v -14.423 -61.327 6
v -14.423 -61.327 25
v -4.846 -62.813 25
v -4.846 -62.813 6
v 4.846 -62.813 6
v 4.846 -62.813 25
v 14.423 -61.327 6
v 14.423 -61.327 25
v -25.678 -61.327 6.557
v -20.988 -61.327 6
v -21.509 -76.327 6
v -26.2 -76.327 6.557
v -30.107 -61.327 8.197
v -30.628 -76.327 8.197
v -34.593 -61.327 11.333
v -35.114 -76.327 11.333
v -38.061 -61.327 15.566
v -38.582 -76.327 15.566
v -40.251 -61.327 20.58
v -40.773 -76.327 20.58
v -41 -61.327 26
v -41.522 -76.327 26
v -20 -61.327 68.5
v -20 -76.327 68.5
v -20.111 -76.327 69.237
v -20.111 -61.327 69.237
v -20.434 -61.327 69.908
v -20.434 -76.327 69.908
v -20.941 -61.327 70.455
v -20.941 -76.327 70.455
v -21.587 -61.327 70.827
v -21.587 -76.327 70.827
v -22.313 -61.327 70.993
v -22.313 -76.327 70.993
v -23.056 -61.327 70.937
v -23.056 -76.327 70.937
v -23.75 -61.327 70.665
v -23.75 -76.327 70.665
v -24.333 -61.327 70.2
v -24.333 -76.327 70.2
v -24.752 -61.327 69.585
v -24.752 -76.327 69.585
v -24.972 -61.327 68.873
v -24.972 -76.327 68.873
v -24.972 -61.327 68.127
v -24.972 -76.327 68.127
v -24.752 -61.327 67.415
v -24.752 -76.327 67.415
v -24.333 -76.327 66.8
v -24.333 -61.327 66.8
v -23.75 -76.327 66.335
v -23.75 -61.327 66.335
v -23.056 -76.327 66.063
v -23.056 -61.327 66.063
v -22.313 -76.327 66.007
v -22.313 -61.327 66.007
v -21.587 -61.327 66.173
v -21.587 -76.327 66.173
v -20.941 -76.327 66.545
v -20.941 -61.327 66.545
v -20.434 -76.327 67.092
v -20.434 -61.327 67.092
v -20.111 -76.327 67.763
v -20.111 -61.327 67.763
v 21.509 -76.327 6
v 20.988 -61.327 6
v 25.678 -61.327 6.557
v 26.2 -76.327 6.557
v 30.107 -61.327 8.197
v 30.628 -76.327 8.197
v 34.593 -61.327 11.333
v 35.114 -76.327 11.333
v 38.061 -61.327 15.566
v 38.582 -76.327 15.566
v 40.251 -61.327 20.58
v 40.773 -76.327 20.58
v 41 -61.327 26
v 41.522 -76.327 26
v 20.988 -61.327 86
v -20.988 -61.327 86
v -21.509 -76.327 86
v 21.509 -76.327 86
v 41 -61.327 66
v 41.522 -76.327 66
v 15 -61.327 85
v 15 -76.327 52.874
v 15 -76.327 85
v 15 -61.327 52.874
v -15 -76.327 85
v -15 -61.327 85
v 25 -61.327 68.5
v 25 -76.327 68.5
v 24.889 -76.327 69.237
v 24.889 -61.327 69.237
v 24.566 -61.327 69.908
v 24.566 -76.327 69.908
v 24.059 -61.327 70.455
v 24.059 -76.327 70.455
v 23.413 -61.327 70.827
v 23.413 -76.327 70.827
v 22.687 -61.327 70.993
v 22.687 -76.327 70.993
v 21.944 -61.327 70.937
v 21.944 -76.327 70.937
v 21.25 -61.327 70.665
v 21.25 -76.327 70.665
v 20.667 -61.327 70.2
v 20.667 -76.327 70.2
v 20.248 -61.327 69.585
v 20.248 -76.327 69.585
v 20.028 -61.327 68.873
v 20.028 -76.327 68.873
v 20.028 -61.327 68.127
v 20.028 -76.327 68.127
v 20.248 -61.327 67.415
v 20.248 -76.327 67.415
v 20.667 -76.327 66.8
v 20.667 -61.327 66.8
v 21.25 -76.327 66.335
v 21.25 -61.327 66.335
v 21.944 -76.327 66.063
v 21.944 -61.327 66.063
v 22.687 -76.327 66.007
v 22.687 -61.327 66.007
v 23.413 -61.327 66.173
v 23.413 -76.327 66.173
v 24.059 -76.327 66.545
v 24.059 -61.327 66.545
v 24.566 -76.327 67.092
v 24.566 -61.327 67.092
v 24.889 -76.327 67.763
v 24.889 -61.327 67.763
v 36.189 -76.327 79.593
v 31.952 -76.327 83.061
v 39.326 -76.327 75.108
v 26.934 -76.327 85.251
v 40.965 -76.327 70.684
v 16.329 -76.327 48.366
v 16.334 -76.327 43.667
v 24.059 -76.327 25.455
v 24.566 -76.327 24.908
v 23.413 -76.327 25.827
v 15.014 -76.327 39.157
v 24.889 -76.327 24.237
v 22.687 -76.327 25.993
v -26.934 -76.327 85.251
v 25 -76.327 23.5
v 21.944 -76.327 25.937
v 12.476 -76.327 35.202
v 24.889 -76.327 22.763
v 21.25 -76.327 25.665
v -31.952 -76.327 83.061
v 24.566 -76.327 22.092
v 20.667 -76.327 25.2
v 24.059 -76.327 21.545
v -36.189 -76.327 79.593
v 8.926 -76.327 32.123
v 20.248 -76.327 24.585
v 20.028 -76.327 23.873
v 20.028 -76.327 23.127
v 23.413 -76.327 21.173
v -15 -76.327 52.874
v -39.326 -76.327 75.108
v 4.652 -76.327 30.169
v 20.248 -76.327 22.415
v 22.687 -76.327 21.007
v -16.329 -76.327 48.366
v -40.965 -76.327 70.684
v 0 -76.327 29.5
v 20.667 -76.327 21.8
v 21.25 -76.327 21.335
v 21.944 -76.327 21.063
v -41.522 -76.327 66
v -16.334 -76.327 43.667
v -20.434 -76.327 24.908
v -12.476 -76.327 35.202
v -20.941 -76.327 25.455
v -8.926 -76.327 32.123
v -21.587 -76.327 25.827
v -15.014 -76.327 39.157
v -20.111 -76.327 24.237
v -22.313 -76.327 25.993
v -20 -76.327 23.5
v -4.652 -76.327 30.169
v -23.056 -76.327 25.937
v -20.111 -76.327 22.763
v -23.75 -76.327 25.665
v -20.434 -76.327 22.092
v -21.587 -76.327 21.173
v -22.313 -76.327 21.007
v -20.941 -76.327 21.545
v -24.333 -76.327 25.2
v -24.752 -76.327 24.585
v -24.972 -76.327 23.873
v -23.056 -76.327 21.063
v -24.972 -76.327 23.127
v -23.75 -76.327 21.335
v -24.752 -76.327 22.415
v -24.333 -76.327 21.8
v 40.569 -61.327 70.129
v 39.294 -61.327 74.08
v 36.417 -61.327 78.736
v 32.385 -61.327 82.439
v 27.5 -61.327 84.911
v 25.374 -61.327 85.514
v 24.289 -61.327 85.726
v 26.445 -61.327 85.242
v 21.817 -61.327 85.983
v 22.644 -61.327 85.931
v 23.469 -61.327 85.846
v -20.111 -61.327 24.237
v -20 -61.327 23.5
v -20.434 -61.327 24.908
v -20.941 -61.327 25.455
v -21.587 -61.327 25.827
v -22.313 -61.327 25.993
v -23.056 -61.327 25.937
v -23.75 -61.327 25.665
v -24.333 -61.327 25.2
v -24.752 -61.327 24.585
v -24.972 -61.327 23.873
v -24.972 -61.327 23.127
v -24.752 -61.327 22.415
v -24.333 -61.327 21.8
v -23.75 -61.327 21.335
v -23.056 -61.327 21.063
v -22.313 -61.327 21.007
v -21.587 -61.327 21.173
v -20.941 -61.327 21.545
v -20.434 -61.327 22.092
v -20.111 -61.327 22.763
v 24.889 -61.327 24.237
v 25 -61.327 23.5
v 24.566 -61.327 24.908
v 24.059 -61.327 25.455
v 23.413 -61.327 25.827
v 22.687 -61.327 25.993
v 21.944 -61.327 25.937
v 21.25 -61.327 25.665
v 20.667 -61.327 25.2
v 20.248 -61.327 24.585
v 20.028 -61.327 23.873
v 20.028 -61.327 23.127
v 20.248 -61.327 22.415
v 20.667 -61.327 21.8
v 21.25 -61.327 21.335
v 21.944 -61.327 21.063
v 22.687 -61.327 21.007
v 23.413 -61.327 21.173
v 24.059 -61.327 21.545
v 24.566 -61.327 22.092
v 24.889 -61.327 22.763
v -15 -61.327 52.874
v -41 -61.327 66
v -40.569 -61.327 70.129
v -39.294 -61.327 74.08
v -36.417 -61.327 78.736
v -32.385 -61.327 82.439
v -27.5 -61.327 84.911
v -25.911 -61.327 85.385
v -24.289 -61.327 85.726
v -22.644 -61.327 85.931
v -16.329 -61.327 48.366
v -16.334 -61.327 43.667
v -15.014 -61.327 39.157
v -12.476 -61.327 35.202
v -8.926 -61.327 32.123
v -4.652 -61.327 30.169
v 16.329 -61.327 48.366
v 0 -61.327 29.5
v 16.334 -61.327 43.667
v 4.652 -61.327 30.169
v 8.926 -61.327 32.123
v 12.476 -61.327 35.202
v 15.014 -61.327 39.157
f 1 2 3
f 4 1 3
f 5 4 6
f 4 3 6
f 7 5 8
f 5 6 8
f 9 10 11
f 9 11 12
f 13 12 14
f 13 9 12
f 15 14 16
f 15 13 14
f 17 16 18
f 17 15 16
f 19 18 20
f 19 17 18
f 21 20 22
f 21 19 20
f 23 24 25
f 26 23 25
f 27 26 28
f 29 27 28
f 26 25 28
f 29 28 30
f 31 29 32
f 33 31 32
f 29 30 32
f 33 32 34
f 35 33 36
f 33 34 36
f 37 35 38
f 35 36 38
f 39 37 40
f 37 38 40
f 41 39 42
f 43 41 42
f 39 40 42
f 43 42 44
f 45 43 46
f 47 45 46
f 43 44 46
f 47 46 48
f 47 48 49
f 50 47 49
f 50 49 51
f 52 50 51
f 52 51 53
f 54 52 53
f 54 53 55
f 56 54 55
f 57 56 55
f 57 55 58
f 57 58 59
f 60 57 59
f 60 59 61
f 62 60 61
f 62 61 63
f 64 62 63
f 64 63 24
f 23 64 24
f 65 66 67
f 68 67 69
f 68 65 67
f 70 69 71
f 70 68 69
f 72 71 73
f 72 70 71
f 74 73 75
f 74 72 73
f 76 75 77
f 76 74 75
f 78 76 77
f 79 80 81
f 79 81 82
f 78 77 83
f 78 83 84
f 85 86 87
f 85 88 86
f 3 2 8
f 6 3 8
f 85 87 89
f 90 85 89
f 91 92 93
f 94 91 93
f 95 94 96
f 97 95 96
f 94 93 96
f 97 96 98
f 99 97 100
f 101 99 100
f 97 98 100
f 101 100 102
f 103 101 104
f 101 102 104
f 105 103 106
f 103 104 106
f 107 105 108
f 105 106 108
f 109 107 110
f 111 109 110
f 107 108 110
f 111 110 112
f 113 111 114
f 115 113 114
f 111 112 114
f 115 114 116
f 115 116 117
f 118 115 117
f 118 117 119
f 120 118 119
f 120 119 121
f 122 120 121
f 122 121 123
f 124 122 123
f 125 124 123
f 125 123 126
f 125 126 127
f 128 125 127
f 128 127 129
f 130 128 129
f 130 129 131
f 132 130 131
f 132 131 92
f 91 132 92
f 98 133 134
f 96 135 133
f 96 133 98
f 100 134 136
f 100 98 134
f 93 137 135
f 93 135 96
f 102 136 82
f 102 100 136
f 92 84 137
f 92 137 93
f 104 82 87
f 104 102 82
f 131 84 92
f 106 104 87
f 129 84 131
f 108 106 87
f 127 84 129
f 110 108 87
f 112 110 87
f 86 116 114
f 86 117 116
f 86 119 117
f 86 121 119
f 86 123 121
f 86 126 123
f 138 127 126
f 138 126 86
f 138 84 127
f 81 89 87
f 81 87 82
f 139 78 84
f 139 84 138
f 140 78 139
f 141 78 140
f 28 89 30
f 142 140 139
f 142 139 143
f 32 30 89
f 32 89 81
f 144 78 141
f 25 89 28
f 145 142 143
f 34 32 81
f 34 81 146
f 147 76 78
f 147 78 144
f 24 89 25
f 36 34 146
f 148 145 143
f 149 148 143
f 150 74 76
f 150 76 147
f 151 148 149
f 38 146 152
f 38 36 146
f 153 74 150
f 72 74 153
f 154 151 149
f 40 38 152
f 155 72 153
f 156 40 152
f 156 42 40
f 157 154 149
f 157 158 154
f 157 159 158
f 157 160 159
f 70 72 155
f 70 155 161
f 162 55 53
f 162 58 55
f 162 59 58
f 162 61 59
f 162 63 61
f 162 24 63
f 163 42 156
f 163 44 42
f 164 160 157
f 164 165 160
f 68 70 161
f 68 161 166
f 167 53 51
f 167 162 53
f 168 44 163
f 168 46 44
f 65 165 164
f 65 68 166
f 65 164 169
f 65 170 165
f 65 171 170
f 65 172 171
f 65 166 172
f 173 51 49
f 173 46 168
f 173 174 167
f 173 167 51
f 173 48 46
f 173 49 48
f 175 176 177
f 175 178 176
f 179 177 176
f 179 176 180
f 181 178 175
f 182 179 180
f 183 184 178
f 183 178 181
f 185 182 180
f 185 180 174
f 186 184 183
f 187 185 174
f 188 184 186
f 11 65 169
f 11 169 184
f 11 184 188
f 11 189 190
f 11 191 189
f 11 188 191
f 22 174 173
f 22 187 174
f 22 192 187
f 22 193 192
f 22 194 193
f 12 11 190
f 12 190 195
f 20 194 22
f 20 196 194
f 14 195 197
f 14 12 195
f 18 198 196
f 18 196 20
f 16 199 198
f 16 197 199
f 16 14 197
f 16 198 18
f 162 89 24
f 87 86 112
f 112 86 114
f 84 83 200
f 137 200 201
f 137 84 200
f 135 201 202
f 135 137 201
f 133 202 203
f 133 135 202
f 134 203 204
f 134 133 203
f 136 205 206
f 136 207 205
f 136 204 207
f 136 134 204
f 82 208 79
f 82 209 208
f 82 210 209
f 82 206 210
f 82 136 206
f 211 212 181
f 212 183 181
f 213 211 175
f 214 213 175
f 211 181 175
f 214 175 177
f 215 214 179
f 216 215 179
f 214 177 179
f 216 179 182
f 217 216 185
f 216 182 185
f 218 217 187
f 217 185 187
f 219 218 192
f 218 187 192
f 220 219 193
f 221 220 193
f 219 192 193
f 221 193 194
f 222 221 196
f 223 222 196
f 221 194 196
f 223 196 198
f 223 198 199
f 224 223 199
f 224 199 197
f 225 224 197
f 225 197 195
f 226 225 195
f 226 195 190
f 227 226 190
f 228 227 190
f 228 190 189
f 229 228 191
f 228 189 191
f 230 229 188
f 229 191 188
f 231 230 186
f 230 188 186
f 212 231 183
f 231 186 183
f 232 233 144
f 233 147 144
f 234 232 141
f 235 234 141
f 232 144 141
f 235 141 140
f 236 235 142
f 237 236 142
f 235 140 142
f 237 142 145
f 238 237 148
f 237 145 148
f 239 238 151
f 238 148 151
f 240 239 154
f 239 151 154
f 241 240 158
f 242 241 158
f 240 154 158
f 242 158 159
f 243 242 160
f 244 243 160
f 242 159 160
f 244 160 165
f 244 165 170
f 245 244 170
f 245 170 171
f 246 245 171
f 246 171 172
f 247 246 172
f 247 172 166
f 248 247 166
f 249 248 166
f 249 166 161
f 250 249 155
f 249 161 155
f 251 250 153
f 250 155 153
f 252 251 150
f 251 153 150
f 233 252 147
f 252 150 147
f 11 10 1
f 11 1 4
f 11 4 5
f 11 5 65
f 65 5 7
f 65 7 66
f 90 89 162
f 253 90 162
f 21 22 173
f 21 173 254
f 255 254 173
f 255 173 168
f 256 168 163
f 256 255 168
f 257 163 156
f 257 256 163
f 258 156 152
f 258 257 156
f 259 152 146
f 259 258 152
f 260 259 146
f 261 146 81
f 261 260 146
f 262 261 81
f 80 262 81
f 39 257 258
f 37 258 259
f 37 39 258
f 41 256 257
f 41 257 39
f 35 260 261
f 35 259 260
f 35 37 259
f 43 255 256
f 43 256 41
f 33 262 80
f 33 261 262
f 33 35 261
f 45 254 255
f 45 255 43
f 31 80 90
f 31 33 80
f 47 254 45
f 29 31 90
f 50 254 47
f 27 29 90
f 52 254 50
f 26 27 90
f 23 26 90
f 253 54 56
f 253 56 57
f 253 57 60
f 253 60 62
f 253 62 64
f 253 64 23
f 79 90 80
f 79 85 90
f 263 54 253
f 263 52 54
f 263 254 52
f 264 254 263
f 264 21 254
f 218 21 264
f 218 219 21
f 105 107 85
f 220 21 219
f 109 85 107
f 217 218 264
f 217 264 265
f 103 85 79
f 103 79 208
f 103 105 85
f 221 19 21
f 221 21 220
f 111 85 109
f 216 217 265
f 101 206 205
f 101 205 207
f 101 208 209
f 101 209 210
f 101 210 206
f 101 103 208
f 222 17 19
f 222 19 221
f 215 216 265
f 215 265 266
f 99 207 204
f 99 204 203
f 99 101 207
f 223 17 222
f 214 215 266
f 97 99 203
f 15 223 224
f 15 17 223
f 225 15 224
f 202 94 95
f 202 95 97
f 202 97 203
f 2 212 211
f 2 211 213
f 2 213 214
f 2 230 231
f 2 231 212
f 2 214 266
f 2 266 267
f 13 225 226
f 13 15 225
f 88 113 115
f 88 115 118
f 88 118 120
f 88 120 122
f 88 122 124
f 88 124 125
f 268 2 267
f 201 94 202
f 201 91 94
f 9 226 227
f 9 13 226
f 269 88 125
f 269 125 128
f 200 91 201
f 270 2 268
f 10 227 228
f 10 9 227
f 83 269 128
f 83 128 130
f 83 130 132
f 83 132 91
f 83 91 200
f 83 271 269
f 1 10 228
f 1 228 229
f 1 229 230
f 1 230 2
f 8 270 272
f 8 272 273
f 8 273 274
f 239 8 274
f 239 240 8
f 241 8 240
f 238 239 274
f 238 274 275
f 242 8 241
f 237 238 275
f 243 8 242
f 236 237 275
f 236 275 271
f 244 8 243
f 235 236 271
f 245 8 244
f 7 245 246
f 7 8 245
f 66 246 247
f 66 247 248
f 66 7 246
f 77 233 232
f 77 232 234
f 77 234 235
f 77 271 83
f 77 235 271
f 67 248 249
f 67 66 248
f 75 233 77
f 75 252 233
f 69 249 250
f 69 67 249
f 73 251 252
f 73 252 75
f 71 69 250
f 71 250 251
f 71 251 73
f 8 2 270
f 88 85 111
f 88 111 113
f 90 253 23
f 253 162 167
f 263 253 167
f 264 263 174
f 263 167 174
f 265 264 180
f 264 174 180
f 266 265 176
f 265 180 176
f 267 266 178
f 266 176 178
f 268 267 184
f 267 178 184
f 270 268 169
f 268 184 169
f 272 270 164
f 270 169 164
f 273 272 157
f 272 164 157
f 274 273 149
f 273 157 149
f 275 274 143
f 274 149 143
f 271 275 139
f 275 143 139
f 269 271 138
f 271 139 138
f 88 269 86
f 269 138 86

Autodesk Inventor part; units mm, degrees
ref_plane "YZ Plane" through (0, 0, 0) normal (1, 0, 0) x (0, 1, 0)
sketch "Sketch3" plane through (0, 0, 0) normal (0, 0, 1) x (1, 0, 0)
  circle A0 centre (0, 0) radius 60
  dimension "d49" = 120
sketch "Sketch3 outline for Extrusion2" plane through (0, 0, 0) normal (0, 0, 1) x (1, 0, 0)
  circle A0 centre (0, 0) radius 60
extrude "Extrusion2" add sketch "Sketch3 outline for Extrusion2" along normal blind 67
sketch "Sketch4" plane through (0, 0, 0) normal (0, 0, -1) x (-1, 0, 0)
  circle A0 centre (0, 0) radius 4.25
  dimension "d52" = 8.5
sketch "Sketch4 outline for Extrusion3" plane through (0, 0, 0) normal (0, 0, -1) x (-1, 0, 0)
  circle A0 centre (0, 0) radius 4.25
extrude "Extrusion3" cut sketch "Sketch4 outline for Extrusion3" against normal through all
ref_plane "Work Plane11" through (0, 0, 46) normal (0, 0, 1) x (1, 0, 0)
sketch "Sketch6" plane through (0, 0, 46) normal (0, 0, 1) x (1, 0, 0)
  line L0 (-27.5, -53.326823) -> (27.5, -53.326823)
  line L1 (27.5, -53.326823) -> (27.5, -61.326823)
  line L2 (27.5, -61.326823) -> (-27.5, -61.326823)
  line L3 (-27.5, -61.326823) -> (-27.5, -53.326823)
  circle A0 centre (0, 0) radius 4.25 construction
  circle A1 centre (0, 0) radius 60 construction
  dimension "d63" = 55
  dimension "d64" = 8
sketch "Sketch6 outline for Extrusion5" plane through (0, 0, 46) normal (0, 0, 1) x (1, 0, 0)
  line L0 (-27.5, -53.326823) -> (27.5, -53.326823)
  line L1 (27.5, -53.326823) -> (27.5, -61.326823)
  line L2 (27.5, -61.326823) -> (-27.5, -61.326823)
  line L3 (-27.5, -61.326823) -> (-27.5, -53.326823)
extrude "Extrusion5" add sketch "Sketch6 outline for Extrusion5" along normal mid plane 42
sketch "Sketch7" plane through (0, 0, 46) normal (0, 0, 1) x (1, 0, 0)
  line L0 (-41, -61.326823) -> (41, -61.326823)
  line L1 (41.521509, -76.326823) -> (-41.521509, -76.326823)
  line L2 (27.5, -61.326823) -> (-27.5, -61.326823)
  line L3 (-41.521509, -76.326823) -> (-41, -61.326823)
  line L4 (41.521509, -76.326823) -> (41, -61.326823)
  point P0 (0, 0)
  point P1 (0, -61.326823)
  point P2 (0, -76.326823)
  dimension "d67" = 83.04302
  dimension "d99" = 82
  dimension "d100" = 15
sketch "Sketch7 outline for Extrusion6" plane through (0, 0, 46) normal (0, 0, 1) x (1, 0, 0)
  line L0 (-41, -61.326823) -> (0, -61.326823)
  line L1 (0, -61.326823) -> (41, -61.326823)
  line L2 (41, -61.326823) -> (41.521509, -76.326823)
  line L3 (41.521509, -76.326823) -> (-41.521509, -76.326823)
  line L4 (-41.521509, -76.326823) -> (-41, -61.326823)
extrude "Extrusion6" add sketch "Sketch7 outline for Extrusion6" along normal mid plane 80
sketch "Sketch8" plane through (-41.521509, -76.326823, 86) normal (0, -1, 0) x (1, 0, 0)
  line L0 (64.021509, -62.5) -> (19.021509, -62.5) construction
  line L1 (19.021509, -62.5) -> (19.021509, -17.5) construction
  line L2 (19.021509, -17.5) -> (64.021509, -17.5) construction
  line L3 (64.021509, -17.5) -> (64.021509, -62.5) construction
  circle A0 centre (64.021509, -62.5) radius 2.5
  circle A1 centre (64.021509, -17.5) radius 2.5
  circle A2 centre (19.021509, -62.5) radius 2.5
  circle A3 centre (19.021509, -17.5) radius 2.5
  line L4 (0, 0) -> (83.043018, 0)
  line L5 (83.043018, 0) -> (83.043018, -80)
  point P0 (23.25, -86)
  point P1 (41.521509, -17.5)
  point P2 (41.521509, 0)
  point P3 (64.021509, -40)
  point P4 (83.043018, -40)
  dimension "d75" = 45
  dimension "d78" = 5
  dimension "d79" = 5
  dimension "d101" = 45
  dimension "d102" = 5
  dimension "d103" = 5
sketch "Sketch8 outline for Extrusion7" plane through (-41.521509, -76.326823, 86) normal (0, -1, 0) x (1, 0, 0)
  circle A0 centre (64.021509, -62.5) radius 2.5
  circle A1 centre (64.021509, -17.5) radius 2.5
  circle A2 centre (19.021509, -62.5) radius 2.5
  circle A3 centre (19.021509, -17.5) radius 2.5
extrude "Extrusion7" cut sketch "Sketch8 outline for Extrusion7" against normal blind 25
sketch "Sketch9" plane through (-41.521509, -76.326823, 86) normal (0, -1, 0) x (1, 0, 0)
  circle A0 centre (41.521509, -40) radius 16.5
  circle A1 centre (19.021509, -62.5) radius 2.5 construction
  circle A2 centre (64.021509, -62.5) radius 2.5 construction
  circle A3 centre (64.021509, -17.5) radius 2.5 construction
  circle A4 centre (19.021509, -17.5) radius 2.5 construction
  line L0 (83.043018, 0) -> (83.043018, -80) construction
  line L1 (0, 0) -> (83.043018, 0) construction
  line L2 (0, 0) -> (0, -80) construction
  line L3 (83.043018, -80) -> (0, -80) construction
  point P0 (23.25, -86)
  point P1 (0, -40)
  point P2 (41.521509, 0)
  dimension "d82" = 33
sketch "Sketch9 outline for Extrusion8" plane through (-41.521509, -76.326823, 86) normal (0, -1, 0) x (1, 0, 0)
  circle A0 centre (41.521509, -40) radius 16.5
extrude "Extrusion8" cut sketch "Sketch9 outline for Extrusion8" against normal blind 45
sketch "Sketch14" plane through (0, 0, 46) normal (0, 0, 1) x (1, 0, 0)
  line L0 (16.5, -76.326823) -> (16.5, -31.326823)
  line L1 (16.5, -31.326823) -> (-16.5, -31.326823)
  line L2 (-16.5, -31.326823) -> (-16.5, -16.326823)
  line L3 (-16.5, -16.326823) -> (16.5, -16.326823)
  line L4 (16.5, -16.326823) -> (16.5, -31.326823)
  point P0 (0, 0)
  dimension "d91" = 33
  dimension "d92" = 15
sketch "Sketch14 outline for Extrusion10" plane through (0, 0, 46) normal (0, 0, 1) x (1, 0, 0)
  line L0 (16.5, -31.326823) -> (-16.5, -31.326823)
  line L1 (-16.5, -31.326823) -> (-16.5, -16.326823)
  line L2 (-16.5, -16.326823) -> (16.5, -16.326823)
  line L3 (16.5, -16.326823) -> (16.5, -31.326823)
extrude "Extrusion10" cut sketch "Sketch14 outline for Extrusion10" along normal mid plane 33
sketch "Sketch15" plane through (16.5, -31.326823, 29.5) normal (-1, 0, 0) x (0, 0, 1)
  line L0 (33, 15) -> (0, 15) projected
  line L1 (0, 15) -> (0, 0) projected
  line L2 (0, 0) -> (16.5, 0) projected
  line L3 (16.5, 0) -> (33, 0) projected
  line L4 (33, 0) -> (33, 15) projected
  line L5 (24, 14) -> (9, 14)
  line L6 (9, 14) -> (9, 1)
  line L7 (9, 1) -> (24, 1)
  line L8 (24, 1) -> (24, 14)
  point P0 (-29.5, 31.326823)
  point P1 (16.5, 1)
  point P2 (24, 7.5)
  point P3 (33, 7.5)
  dimension "d95" = 15
  dimension "d96" = 13
sketch "Sketch15 outline for Extrusion11" plane through (16.5, -31.326823, 29.5) normal (-1, 0, 0) x (0, 0, 1)
  line L0 (24, 1) -> (24, 14)
  line L1 (9, 1) -> (24, 1)
  line L2 (9, 14) -> (9, 1)
  line L3 (24, 14) -> (9, 14)
extrude "Extrusion11" cut sketch "Sketch15 outline for Extrusion11" along normal through all
fillet "Fillet4" radius 20 4 edges at (41.2608, -68.8268, 86) (41.2608, -68.8268, 6) (-41.2608, -68.8268, 86) (-41.2608, -68.8268, 6)
ref_plane "Work Plane15" through (0, 0, 25) normal (0, 0, -1) x (-0.9685832, -0.2486899, 0)
sketch "Sketch16" plane through (0, 0, 25) normal (0, 0, -1) x (-0.9685832, -0.2486899, 0)
  circle A0 centre (0, 0) radius 60
  circle A1 centre (0, 0) radius 63
  dimension "d107" = 3
sketch "Sketch16 outline for Extrusion12" plane through (0, 0, 25) normal (0, 0, -1) x (-0.9685832, -0.2486899, 0)
  circle A0 centre (0, 0) radius 63
extrude "Extrusion12" cut sketch "Sketch16 outline for Extrusion12" along normal through all
sketch "Sketch17" plane through (0, 0, 25) normal (0, 0, -1) x (-1, 0, 0)
  circle A0 centre (33.900411, 8.704146) radius 2.5
  circle A1 centre (9.412194, 33.71069) radius 2.5
  circle A2 centre (-24.488217, 25.006544) radius 2.5
  circle A3 centre (-33.900411, -8.704146) radius 2.5
  circle A4 centre (-9.412194, -33.71069) radius 2.5
  circle A5 centre (24.488217, -25.006544) radius 2.5
  line L0 (33.900411, 8.704146) -> (-33.900411, -8.704146) construction
  line L1 (-1.798057, -79.48798) -> (39.869276, -68.789627)
  point P0 (0, 0)
  dimension "d108" = 5
  dimension "d109" = 35
  dimension "d112" = 360
sketch "Sketch17 outline for Extrusion13" plane through (0, 0, 25) normal (0, 0, -1) x (-1, 0, 0)
  circle A0 centre (33.900411, 8.704146) radius 2.5
  circle A1 centre (9.412194, 33.71069) radius 2.5
  circle A2 centre (-24.488217, 25.006544) radius 2.5
  circle A3 centre (-33.900411, -8.704146) radius 2.5
extrude "Extrusion13" cut sketch "Sketch17 outline for Extrusion13" against normal blind 25
sketch "Sketch20" plane through (0, 0, 67) normal (0, 0, 1) x (1, 0, 0)
  arc A0 (27.5, -53.326823) -> (-27.5, -53.326823) centre (0, 0) ccw
  circle A1 centre (0, 0) radius 60
  circle A2 centre (0, 0) radius 4.25
sketch "Sketch20 outline for Extrusion15" plane through (0, 0, 67) normal (0, 0, 1) x (1, 0, 0)
  circle A0 centre (0, 0) radius 60
  circle A1 centre (0, 0) radius 4.25
extrude "Extrusion15" add sketch "Sketch20 outline for Extrusion15" along normal blind 25
sketch "Sketch21" plane through (-21.509425, -76.326823, 6) normal (0, -1, 0) x (1, 0, 0)
  line L0 (36.509425, 79) -> (6.509425, 79)
  line L1 (6.509425, 79) -> (6.509425, 55)
  line L2 (6.509425, 55) -> (36.509425, 55)
  line L3 (36.509425, 55) -> (36.509425, 79)
  circle A0 centre (21.509425, 40) radius 16.5
  line L4 (36.509425, 67) -> (6.509425, 67)
  point P0 (21.509425, -6)
  point P1 (21.509425, 67)
  dimension "d124" = 30
  dimension "d125" = 24
  dimension "d126" = 27
sketch "Sketch21 outline for Extrusion16" plane through (-21.509425, -76.326823, 6) normal (0, -1, 0) x (1, 0, 0)
  line L0 (6.509425, 55) -> (36.509425, 55)
  line L1 (36.509425, 55) -> (36.509425, 79)
  line L2 (36.509425, 79) -> (6.509425, 79)
  line L3 (6.509425, 79) -> (6.509425, 55)
extrude "Extrusion16" cut sketch "Sketch21 outline for Extrusion16" against normal blind 15
sketch "Sketch22" plane through (-27.5, -61.326823, 67) normal (0, 1, 0) x (1, 0, 0)
  line L0 (55, 0) -> (55, 42)
  line L1 (0, 0) -> (0, 42)
  line L2 (0, 0) -> (3, 0)
  line L3 (55, 0) -> (55, -17.911477)
  line L4 (0, 0) -> (0, -17.911477)
  line L5 (5.990575, -19) -> (6.512084, -19) construction
  line L6 (-13.5, 1) -> (-14.021509, 1) construction
  circle A0 centre (5, -1.5) radius 2.5
  line L7 (42.5, -18) -> (42.5, 6)
  line L8 (12.5, -18) -> (42.5, -18)
  line L9 (12.5, 6) -> (12.5, -18)
  line L10 (7, 0) -> (12.5, 0)
  line L11 (12.5, 0) -> (12.5, -18)
  line L12 (12.5, -18) -> (42.5, -18)
  line L13 (55, 0) -> (52, 0)
  circle A1 centre (50, -1.5) radius 2.5
  line L14 (48, 0) -> (42.5, 0)
  line L15 (42.5, 0) -> (42.5, -18)
  arc A2 (48, 0) -> (52, 0) centre (50, -1.5) ccw
  arc A3 (3, 0) -> (7, 0) centre (5, -1.5) ccw
  line L16 (5.990575, -19) -> (6.285813, -19)
  line L17 (-13.5, 1) -> (-14.021509, 1)
  line L18 (5.990575, -19) -> (6.512084, -19)
  line L19 (48.487916, -19) -> (49.009425, -19)
  arc A4 (0, -17.911477) -> (6.285813, -19) centre (6.512084, 1) ccw
  arc A5 (48.487916, -19) -> (55, -17.911477) centre (48.487997, 1.023032) ccw
  line L20 (48.487916, -19) -> (6.285813, -19)
  line L21 (5.990575, -19) -> (49.009425, -19)
  ellipse E0 centre (5.990575, 1) end of major axis (-14.021509, 1) minor radius 20 (-14.021509, 1) -> (5.990575, -19) ccw
  line L22 (5.990575, -19) -> (6.512084, -19)
  ellipse E1 centre (6.512084, 1) end of major axis (-13.5, 1) minor radius 20 (-13.5, 1) -> (6.512084, -19) ccw
  line L23 (-13.5, 1) -> (-14.021509, 1)
  ellipse E2 centre (48.487916, 1) end of major axis (68.5, 1) minor radius 20 (48.487916, -19) -> (68.5, 1) ccw
  line L24 (48.487916, -19) -> (49.009425, -19)
  ellipse E3 centre (49.009425, 1) end of major axis (69.021509, 1) minor radius 20 (49.009425, -19) -> (69.021509, 1) ccw
  line L25 (69.021509, 1) -> (68.5, 1)
  point P0 (27.5, 67)
  point P1 (51.789134, -18.726001)
sketch "Sketch22 outline for Extrusion17" plane through (-27.5, -61.326823, 67) normal (0, 1, 0) x (1, 0, 0)
  line L0 (55, -17.911477) -> (55, 0)
  arc A0 (51.789134, -18.726001) -> (55, -17.911477) centre (48.487997, 1.023032) ccw
  arc A1 (48.487916, -19) -> (51.789134, -18.726001) centre (48.487997, 1.023032) ccw
  line L1 (6.285813, -19) -> (48.487916, -19)
  arc A2 (0, -17.911477) -> (6.285813, -19) centre (6.512084, 1) ccw
  line L2 (0, 0) -> (0, -17.911477)
  line L3 (3, 0) -> (0, 0)
  arc A3 (7, 0) -> (3, 0) centre (5, -1.5) cw
  line L4 (12.5, 0) -> (7, 0)
  line L5 (12.5, -18) -> (12.5, 0)
  line L6 (42.5, -18) -> (12.5, -18)
  line L7 (42.5, 0) -> (42.5, -18)
  line L8 (48, 0) -> (42.5, 0)
  arc A4 (52, 0) -> (48, 0) centre (50, -1.5) cw
  line L9 (55, 0) -> (52, 0)
extrude "Extrusion17" add sketch "Sketch22 outline for Extrusion17" along normal blind 15
sketch "Sketch23" plane through (-21.509425, -76.326823, 6) normal (0, -1, 0) x (1, 0, 0)
  line L0 (36.509425, 79) -> (36.509425, 55)
  line L1 (36.509425, 55) -> (6.509425, 55)
  line L2 (6.509425, 55) -> (6.509425, 79)
  line L3 (6.509425, 79) -> (36.509425, 79)
  point P0 (21.509425, -6)
sketch "Sketch23 outline for Extrusion18" plane through (-21.509425, -76.326823, 6) normal (0, -1, 0) x (1, 0, 0)
  line L0 (36.509425, 79) -> (36.509425, 55)
  line L1 (36.509425, 55) -> (6.509425, 55)
  line L2 (6.509425, 55) -> (6.509425, 79)
  line L3 (6.509425, 79) -> (36.509425, 79)
extrude "Extrusion18" cut sketch "Sketch23 outline for Extrusion18" against normal blind 20
sketch "Sketch25" plane through (-21.509425, -56.326823, 6) normal (0, -1, 0) x (1, 0, 0)
  line L0 (36.509425, 55) -> (28.383288, 55)
  arc A0 (21.509425, 56.5) -> (5.009425, 40) centre (21.509425, 40) ccw
  line L1 (36.509425, 55) -> (6.509425, 55)
  line L2 (6.509425, 55) -> (6.509425, 46.873864)
  line L3 (6.509425, 46.873864) -> (36.509425, 46.873864)
  line L4 (36.509425, 46.873864) -> (36.509425, 55)
  point P0 (21.509425, -6)
sketch "Sketch25 outline for Extrusion20" plane through (-21.509425, -56.326823, 6) normal (0, -1, 0) x (1, 0, 0)
  line L0 (36.509425, 46.873864) -> (36.509425, 55)
  line L1 (6.509425, 46.873864) -> (36.509425, 46.873864)
  line L2 (6.509425, 55) -> (6.509425, 46.873864)
  line L3 (36.509425, 55) -> (6.509425, 55)
extrude "Extrusion20" cut sketch "Sketch25 outline for Extrusion20" along normal blind 25
sketch "Sketch26" plane through (0, 0, 92) normal (0, 0, 1) x (1, 0, 0)
  circle A0 centre (0, 0) radius 4.25 projected
  circle A1 centre (0, 0) radius 13.5
  dimension "d138" = 27
sketch "Sketch26 outline for Extrusion21" plane through (0, 0, 92) normal (0, 0, 1) x (1, 0, 0)
  circle A0 centre (0, 0) radius 13.5
  circle A1 centre (0, 0) radius 4.25
extrude "Extrusion21" cut sketch "Sketch26 outline for Extrusion21" against normal blind 10
sketch "Sketch27" plane through (0, 0, 82) normal (0, 0, 1) x (1, 0, 0)
  circle A0 centre (9.525, 0) radius 1.5
  circle A1 centre (4.7625, 8.248892) radius 1.5
  circle A2 centre (-4.7625, 8.248892) radius 1.5
  circle A3 centre (-9.525, 0) radius 1.5
  circle A4 centre (-4.7625, -8.248892) radius 1.5
  circle A5 centre (4.7625, -8.248892) radius 1.5
  point P0 (0, 0)
  dimension "d141" = 3
  dimension "d142" = 9.525
  dimension "d145" = 360
sketch "Sketch27 outline for Extrusion22" plane through (0, 0, 82) normal (0, 0, 1) x (1, 0, 0)
  circle A0 centre (9.525, 0) radius 1.5
  circle A1 centre (4.7625, 8.248892) radius 1.5
  circle A2 centre (-4.7625, 8.248892) radius 1.5
  circle A3 centre (-9.525, 0) radius 1.5
  circle A4 centre (-4.7625, -8.248892) radius 1.5
  circle A5 centre (4.7625, -8.248892) radius 1.5
extrude "Extrusion22" cut sketch "Sketch27 outline for Extrusion22" against normal blind 15
sketch "Sketch28" plane through (0, 0, 0) normal (0, 1, 0) x (-1, 0, 0)
  circle A0 centre (0, 79.65) radius 1.5
  circle A1 centre (0, 84.75) radius 1.5
  line L0 (4.25, 82) -> (-4.25, 82) projected
  line L1 (0, 82) -> (0, 83.25)
  line L2 (0, 83.25) -> (0, 81.15)
  point P0 (0, 0)
  point P1 (0, 86.25)
  dimension "d151" = 3
  dimension "d150" = 3
  dimension "d153" = 1.25
  dimension "d166" = 2.1
sketch "Sketch28 outline for Extrusion23" plane through (0, 0, 0) normal (0, 1, 0) x (-1, 0, 0)
  circle A0 centre (0, 79.65) radius 1.5
  circle A1 centre (0, 84.75) radius 1.5
extrude "Extrusion23" cut sketch "Sketch28 outline for Extrusion23" along normal through all
sketch "Sketch29" plane through (0, 0, 92) normal (0, 0, 1) x (1, 0, 0)
  circle A0 centre (0, 0) radius 17.5
  circle A1 centre (0, 0) radius 50
  dimension "d156" = 35
  dimension "d157" = 100
sketch "Sketch29 outline for Extrusion24" plane through (0, 0, 92) normal (0, 0, 1) x (1, 0, 0)
  circle A0 centre (0, 0) radius 50
  circle A1 centre (0, 0) radius 17.5
extrude "Extrusion24" cut sketch "Sketch29 outline for Extrusion24" against normal blind 20
sketch "Sketch30" plane through (0, 0, 82) normal (0, 0, 1) x (1, 0, 0)
  circle A0 centre (0, 0) radius 17.5 projected
sketch "Sketch30 outline for Extrusion25" plane through (0, 0, 82) normal (0, 0, 1) x (1, 0, 0)
  circle A0 centre (0, 0) radius 17.5
extrude "Extrusion25" cut sketch "Sketch30 outline for Extrusion25" along normal through all
sketch "Sketch32" plane through (0, 0, 82) normal (0, 0, 1) x (1, 0, 0)
  circle A0 centre (0, 0) radius 7.5
  dimension "d162" = 15
sketch "Sketch32 outline for Extrusion26" plane through (0, 0, 82) normal (0, 0, 1) x (1, 0, 0)
  circle A0 centre (0, 0) radius 7.5
extrude "Extrusion26" cut sketch "Sketch32 outline for Extrusion26" against normal blind 5
sketch "Sketch34" plane through (0, 0, 72) normal (0, 0, 1) x (1, 0, 0)
  line L0 (-15, -56.326823) -> (-15, -76.326823)
  line L1 (-15, -56.326823) -> (15, -56.326823)
  line L2 (15, -56.326823) -> (15, -21.326823)
  line L3 (15, -21.326823) -> (-15, -21.326823)
  line L4 (-15, -21.326823) -> (-15, -56.326823)
  line L5 (15, -76.326823) -> (15, -56.326823)
  point P0 (0, 0)
  dimension "d167" = 35
sketch "Sketch34 outline for Extrusion27" plane through (0, 0, 72) normal (0, 0, 1) x (1, 0, 0)
  line L0 (-15, -21.326823) -> (-15, -56.326823)
  line L1 (15, -21.326823) -> (-15, -21.326823)
  line L2 (15, -56.326823) -> (15, -21.326823)
  line L3 (-15, -56.326823) -> (15, -56.326823)
extrude "Extrusion27" cut sketch "Sketch34 outline for Extrusion27" along normal blind 13 and the other way blind 20
sketch "Sketch35" plane through (-22.5, -61.326823, 23.5) normal (0, 1, 0) x (1, 0, 0)
  line L0 (-57.985682, -108.685888) -> (95.221181, -108.685888)
  line L1 (95.221181, -108.685888) -> (95.221181, 61.564991)
  line L2 (95.221181, 61.564991) -> (-57.985682, 61.564991)
  line L3 (-57.985682, 61.564991) -> (-57.985682, -108.685888)
  point P0 (22.5, 23.5)
sketch "Sketch35 outline for Extrusion28" plane through (-22.5, -61.326823, 23.5) normal (0, 1, 0) x (1, 0, 0)
  line L0 (-57.985682, 61.564991) -> (-57.985682, -108.685888)
  line L1 (95.221181, 61.564991) -> (-57.985682, 61.564991)
  line L2 (95.221181, -108.685888) -> (95.221181, 61.564991)
  line L3 (-57.985682, -108.685888) -> (95.221181, -108.685888)
extrude "Extrusion28" cut sketch "Sketch35 outline for Extrusion28" along normal through all
equation "\"d43\" = da_aw"
equation "\"d46\" = da_aw"
equation "\"da_aw\" = 81.5"
properties part number "AA035" material "ABS Plastic"
